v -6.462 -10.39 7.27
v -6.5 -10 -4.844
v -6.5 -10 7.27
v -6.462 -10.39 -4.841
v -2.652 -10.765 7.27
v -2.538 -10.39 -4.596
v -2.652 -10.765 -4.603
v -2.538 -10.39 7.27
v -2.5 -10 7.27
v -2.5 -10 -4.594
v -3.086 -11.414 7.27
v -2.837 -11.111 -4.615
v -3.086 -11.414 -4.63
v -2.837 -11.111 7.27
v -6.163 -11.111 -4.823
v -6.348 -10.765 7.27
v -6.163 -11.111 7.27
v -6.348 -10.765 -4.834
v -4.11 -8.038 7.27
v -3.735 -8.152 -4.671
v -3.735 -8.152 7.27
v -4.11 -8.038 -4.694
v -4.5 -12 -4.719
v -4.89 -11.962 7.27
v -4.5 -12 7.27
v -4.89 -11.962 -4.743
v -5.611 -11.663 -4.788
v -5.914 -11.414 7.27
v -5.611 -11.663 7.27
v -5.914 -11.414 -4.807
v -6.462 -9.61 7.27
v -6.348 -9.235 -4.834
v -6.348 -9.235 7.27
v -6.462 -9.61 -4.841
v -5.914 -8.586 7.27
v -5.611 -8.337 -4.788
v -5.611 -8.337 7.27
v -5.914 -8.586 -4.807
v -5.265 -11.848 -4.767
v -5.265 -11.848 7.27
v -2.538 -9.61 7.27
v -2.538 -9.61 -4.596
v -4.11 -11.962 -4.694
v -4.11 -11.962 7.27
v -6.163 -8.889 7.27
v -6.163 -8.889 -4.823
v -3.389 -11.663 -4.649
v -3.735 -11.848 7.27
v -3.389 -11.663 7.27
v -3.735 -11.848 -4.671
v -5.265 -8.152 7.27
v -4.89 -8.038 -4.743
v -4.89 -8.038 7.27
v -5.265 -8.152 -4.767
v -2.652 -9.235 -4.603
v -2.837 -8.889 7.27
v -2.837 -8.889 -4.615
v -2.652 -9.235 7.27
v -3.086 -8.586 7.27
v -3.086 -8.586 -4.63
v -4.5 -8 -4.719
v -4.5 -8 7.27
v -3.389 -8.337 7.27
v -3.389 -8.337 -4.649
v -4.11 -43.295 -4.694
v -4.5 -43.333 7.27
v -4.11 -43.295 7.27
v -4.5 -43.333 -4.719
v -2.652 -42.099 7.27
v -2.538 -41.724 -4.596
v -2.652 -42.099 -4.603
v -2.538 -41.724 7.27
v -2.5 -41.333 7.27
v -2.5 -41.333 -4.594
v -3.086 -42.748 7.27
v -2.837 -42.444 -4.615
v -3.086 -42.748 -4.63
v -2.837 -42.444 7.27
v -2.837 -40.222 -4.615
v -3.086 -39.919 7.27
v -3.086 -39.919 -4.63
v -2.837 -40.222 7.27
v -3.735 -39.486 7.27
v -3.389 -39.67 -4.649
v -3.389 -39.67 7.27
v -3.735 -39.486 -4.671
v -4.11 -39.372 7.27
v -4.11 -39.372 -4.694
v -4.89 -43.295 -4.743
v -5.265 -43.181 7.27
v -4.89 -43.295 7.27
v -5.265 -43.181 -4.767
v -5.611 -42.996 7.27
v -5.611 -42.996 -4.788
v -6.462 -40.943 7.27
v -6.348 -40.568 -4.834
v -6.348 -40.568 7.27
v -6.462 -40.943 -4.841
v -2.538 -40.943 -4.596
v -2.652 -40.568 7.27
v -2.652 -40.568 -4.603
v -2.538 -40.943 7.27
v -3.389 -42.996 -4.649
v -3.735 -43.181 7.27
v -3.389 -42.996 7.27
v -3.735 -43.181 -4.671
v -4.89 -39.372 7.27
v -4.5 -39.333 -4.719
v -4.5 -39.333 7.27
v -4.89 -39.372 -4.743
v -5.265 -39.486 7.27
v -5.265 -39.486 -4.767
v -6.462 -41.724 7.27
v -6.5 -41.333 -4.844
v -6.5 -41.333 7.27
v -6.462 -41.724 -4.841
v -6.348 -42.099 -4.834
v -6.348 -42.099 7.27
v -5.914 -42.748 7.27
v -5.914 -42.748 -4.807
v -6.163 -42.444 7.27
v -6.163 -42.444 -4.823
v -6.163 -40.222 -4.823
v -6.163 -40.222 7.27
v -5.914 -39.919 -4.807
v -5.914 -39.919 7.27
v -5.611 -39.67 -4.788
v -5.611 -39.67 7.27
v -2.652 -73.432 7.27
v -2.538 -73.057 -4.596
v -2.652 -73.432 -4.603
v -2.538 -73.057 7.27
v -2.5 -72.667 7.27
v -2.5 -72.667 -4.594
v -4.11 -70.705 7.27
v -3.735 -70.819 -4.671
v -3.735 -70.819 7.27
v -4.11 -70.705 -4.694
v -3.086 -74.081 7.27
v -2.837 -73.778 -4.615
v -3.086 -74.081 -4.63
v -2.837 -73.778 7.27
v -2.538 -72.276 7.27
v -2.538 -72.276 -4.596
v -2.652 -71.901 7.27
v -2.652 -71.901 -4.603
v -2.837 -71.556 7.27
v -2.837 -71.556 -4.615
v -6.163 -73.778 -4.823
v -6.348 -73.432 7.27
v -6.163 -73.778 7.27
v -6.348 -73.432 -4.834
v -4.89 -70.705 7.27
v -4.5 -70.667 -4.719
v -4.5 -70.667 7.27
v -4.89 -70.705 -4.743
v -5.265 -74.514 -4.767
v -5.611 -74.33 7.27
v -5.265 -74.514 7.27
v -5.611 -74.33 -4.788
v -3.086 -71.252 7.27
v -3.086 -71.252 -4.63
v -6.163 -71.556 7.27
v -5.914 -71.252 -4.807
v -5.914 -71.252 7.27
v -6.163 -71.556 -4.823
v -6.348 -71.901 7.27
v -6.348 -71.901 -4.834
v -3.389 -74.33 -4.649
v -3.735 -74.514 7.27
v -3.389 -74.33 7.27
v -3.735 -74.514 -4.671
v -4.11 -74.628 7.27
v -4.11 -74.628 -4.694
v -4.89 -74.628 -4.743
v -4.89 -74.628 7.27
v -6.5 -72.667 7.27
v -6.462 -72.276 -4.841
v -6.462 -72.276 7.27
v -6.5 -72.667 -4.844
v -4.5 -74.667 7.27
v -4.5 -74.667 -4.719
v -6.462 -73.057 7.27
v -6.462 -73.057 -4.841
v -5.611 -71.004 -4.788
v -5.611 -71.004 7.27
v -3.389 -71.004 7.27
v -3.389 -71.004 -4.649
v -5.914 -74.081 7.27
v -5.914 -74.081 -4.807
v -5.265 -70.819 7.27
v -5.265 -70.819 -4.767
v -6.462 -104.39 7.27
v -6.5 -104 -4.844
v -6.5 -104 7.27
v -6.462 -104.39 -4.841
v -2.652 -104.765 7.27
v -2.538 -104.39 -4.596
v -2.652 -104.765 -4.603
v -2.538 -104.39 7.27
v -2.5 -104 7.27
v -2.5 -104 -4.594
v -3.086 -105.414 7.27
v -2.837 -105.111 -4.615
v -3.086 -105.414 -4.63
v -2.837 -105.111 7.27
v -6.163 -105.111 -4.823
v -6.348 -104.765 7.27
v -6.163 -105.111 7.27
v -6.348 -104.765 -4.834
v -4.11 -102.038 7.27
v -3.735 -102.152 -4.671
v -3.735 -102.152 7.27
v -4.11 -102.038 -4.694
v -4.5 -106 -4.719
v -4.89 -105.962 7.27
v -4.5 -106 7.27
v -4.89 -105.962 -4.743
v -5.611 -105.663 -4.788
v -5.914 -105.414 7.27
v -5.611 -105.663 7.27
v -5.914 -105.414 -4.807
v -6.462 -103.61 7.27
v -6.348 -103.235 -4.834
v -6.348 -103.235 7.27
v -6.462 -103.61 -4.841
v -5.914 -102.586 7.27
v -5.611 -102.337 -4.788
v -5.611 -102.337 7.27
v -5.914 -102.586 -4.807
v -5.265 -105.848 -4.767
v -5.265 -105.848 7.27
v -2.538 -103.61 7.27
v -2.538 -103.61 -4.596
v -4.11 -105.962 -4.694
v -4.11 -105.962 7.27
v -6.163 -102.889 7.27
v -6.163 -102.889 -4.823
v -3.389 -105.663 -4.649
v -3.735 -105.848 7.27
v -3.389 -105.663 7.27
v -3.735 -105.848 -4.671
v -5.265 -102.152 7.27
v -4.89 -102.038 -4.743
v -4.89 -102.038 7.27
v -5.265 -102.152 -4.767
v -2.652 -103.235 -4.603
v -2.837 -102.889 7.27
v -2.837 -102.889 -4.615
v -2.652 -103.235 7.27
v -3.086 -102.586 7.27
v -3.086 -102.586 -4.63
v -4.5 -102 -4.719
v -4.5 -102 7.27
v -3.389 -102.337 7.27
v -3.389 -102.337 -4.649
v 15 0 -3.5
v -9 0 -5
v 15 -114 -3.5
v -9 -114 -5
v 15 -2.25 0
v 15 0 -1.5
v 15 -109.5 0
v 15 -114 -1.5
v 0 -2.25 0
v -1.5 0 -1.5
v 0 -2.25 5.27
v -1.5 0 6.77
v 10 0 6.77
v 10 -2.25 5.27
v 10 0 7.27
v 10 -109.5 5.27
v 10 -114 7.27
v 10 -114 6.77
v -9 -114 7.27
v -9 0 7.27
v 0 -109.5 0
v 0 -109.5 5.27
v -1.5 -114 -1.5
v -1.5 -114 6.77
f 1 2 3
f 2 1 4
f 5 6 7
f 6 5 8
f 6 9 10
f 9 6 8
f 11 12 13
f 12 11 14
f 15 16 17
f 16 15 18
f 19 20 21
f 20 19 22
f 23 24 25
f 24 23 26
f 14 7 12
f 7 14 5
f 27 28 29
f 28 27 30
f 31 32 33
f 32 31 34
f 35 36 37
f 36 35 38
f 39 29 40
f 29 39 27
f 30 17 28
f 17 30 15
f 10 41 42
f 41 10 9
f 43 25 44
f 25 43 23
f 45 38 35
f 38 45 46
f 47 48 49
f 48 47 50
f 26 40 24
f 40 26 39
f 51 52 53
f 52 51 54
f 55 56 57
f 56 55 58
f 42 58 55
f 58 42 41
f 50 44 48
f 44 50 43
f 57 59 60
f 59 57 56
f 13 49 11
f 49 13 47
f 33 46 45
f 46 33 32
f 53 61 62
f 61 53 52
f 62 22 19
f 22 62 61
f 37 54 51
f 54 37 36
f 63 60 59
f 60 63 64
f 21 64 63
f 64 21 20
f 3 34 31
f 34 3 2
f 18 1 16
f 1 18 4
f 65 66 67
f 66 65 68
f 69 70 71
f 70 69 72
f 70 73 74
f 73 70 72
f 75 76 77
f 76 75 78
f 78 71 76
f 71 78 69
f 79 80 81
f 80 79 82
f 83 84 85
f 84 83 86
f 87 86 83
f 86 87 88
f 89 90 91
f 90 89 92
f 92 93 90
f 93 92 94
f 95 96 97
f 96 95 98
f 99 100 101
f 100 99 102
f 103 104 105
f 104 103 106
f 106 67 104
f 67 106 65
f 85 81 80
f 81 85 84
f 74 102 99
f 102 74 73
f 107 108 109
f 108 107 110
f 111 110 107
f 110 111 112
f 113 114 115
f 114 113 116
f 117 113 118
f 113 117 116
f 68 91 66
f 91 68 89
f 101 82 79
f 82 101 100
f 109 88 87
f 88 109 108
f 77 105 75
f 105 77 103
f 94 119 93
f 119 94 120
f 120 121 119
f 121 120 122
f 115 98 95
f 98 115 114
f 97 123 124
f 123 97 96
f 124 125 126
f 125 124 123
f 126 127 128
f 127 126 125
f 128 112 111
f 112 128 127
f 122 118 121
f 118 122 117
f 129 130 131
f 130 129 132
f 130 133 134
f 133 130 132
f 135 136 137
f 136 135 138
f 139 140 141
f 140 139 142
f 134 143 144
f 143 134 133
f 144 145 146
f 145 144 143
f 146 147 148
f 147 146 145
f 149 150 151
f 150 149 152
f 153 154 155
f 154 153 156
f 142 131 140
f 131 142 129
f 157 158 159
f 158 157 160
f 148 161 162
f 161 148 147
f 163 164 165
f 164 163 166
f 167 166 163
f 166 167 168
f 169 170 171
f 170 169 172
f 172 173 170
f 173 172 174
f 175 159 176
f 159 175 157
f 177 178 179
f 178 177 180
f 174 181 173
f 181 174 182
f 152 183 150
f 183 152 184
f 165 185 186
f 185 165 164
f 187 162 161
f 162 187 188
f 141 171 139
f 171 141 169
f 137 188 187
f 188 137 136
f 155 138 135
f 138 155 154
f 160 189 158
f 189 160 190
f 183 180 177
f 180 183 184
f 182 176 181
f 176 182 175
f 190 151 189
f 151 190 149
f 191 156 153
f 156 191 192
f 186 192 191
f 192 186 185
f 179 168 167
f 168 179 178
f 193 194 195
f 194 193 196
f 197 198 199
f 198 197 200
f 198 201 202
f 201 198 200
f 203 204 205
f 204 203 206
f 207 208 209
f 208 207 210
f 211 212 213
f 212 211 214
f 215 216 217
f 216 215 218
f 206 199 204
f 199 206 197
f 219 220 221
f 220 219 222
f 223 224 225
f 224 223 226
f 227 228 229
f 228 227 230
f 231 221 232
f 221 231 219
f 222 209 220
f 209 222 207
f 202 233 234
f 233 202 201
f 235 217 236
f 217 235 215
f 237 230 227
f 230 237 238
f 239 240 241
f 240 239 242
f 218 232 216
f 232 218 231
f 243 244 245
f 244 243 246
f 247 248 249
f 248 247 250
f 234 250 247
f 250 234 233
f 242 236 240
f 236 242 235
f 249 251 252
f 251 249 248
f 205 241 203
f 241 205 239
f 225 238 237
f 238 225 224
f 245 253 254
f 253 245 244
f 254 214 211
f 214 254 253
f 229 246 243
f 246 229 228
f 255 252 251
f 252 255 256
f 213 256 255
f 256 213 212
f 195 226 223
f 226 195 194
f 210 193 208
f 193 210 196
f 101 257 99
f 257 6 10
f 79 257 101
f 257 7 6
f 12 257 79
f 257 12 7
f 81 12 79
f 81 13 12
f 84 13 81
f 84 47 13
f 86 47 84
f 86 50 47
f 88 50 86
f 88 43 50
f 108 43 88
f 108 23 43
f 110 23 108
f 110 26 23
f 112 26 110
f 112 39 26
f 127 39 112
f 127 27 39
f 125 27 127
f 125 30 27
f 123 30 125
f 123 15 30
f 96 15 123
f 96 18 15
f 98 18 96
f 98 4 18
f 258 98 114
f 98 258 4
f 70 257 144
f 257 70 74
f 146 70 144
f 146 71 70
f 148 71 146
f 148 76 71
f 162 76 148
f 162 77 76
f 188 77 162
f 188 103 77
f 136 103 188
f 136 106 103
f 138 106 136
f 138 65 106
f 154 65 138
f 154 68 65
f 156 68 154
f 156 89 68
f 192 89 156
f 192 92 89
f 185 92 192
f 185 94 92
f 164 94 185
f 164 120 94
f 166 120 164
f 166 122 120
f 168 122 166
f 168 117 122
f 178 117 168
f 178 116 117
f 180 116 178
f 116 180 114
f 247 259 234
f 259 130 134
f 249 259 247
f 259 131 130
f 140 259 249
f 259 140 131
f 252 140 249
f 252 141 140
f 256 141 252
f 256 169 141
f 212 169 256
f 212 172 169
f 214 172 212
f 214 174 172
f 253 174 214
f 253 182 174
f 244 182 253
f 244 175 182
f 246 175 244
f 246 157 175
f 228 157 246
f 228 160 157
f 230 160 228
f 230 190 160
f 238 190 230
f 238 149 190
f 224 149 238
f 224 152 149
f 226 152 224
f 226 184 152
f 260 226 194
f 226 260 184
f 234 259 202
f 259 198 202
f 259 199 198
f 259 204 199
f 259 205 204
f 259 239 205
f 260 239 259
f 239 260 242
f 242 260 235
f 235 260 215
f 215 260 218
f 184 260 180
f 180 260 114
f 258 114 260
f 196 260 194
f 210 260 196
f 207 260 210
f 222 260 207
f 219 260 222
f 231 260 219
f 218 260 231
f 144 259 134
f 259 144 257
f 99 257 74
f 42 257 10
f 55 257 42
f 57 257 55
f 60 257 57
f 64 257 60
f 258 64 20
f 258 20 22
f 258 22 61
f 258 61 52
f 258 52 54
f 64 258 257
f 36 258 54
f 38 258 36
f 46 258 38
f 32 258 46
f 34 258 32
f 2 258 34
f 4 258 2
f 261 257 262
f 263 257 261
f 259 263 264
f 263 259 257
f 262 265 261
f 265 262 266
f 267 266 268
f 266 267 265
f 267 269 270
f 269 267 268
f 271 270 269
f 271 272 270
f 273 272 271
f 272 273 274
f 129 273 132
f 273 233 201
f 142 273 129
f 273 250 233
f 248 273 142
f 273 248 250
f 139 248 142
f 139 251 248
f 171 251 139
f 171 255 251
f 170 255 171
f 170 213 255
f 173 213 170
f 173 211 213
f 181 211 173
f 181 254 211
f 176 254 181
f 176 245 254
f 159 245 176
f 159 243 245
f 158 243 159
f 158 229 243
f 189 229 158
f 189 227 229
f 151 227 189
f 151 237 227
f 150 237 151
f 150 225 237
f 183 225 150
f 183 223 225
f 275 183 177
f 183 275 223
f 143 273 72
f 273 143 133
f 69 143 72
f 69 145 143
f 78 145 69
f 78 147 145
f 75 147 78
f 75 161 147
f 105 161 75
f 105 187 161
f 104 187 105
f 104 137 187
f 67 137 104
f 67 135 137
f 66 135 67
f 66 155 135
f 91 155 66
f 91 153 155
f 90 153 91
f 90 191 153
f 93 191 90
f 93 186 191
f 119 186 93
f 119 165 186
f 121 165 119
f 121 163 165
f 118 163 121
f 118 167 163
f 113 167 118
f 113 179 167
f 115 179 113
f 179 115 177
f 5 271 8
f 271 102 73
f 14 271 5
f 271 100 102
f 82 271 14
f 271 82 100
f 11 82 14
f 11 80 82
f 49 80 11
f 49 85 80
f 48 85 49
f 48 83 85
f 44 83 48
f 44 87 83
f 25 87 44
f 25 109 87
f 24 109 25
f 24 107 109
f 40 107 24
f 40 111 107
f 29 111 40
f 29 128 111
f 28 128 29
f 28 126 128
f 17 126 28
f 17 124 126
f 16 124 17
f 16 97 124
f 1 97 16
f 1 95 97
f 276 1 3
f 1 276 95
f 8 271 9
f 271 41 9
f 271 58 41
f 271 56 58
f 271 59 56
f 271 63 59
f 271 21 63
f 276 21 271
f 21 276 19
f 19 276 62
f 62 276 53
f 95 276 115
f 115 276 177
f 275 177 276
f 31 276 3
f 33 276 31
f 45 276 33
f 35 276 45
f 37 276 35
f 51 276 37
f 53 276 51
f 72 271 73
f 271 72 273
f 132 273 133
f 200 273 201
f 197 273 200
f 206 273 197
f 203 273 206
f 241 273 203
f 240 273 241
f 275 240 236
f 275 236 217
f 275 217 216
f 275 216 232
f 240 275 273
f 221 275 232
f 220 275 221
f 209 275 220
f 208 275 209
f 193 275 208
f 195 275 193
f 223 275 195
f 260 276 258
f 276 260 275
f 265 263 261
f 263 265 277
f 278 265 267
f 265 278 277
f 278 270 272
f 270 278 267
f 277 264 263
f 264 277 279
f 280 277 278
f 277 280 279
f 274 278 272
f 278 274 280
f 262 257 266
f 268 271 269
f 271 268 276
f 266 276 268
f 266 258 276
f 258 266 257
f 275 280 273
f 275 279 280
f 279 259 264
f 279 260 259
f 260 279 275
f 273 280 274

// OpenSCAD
//use <tubemesh.scad>;
// params = [sections,sectionCounts]

// written for tail-recursion
// _subtotals[i] = list[0] + ... + list[i-1]
function _subtotals(list,soFar=[]) =
        len(soFar) >= 1+len(list) ? soFar :
        _subtotals(list,
            let(n1=len(soFar))
            concat(soFar, n1>0 ? soFar[n1-1]+list[n1-1] : 0));

function _flatten(list) = [for (a=list) for(b=a) b];

function _reverseTriangle(t) = [t[2], t[1], t[0]];

// smallest angle in triangle
function _minAngle(p1,p2,p3) =
    let(a = p2-p1,
        b = p3-p1,
        c = p3-p2,
        v1 = a*b,
        v2 = -(c*a))
        v1 == 0 || v2 == 0 ? 0 :
        let( na = norm(a),
             a1 = acos(v1 / (na*norm(b))),
             a2 = acos(v2 / (na*norm(c))) )
        min(a1,a2,180-(a1+a2));

// triangulate square to maximize smallest angle
function _doSquare(points,i11,i21,i22,i12,optimize=true) =
    points[i11]==points[i12] ? [[i11,i21,i22]] :
    points[i21]==points[i22] ? [[i22,i12,i11]] :
    !optimize ? [[i11,i21,i22], [i22,i12,i11]] :
    let (m1 = min(_minAngle(points[i11],points[i21],points[i22]), _minAngle(points[i22],points[i12],points[i11])),
        m2 = min(_minAngle(points[i11],points[i21],points[i12]),
                _minAngle(points[i21],points[i22],points[i12])) )
        m2 <= m1 ? [[i11,i21,i22], [i22,i12,i11]] :
                  [[i11,i21,i12], [i21,i22,i12]];

/*
function _inTriangle(v1,t) = (v1==t[0] || v1==t[1] || v1==t[2]);

function _findTheDistinctVertex(t1,t2) =
    let(in = [for(i=[0:2]) _inTriangle(t1[i],t2)])
    ! in[0] && in[1] && in[2] ? 0 :
    ! in[1] && in[0] && in[2] ? 1 :
    ! in[2] && in[0] && in[1] ? 2 :
    undef;

// make vertex i come first
function _rotateTriangle(t,i) =
    [for (j=[0:2]) t[(j+i)%3]];

function _optimize2Triangles(points,t1,t2) =
    let(i1 = _findTheDistinctVertex(t1,t2))
    i1 == undef ? [t1,t2] :
    let(i2 = _findTheDistinctVertex(t2,t1))
    i2 == undef ? [t1,t2] :
    let(t1 = _rotateTriangle(t1,i1),
        t2 = _rotateTriangle(t2,i2))
    _doSquare(points,t1[1],t2[0],t2[1],t1[0],optimize=true);

// a greedy optimization for a strip of triangles most of which adjoin one another; written for tail-recursion
function _optimizeTriangles(points,triangles,position=0,optimize=true,iterations=4) =
        !optimize || position >= iterations*len(triangles) ? triangles :
            _optimizeTriangles(points,
                let(
                    n = len(triangles),
                    position1=position%n,
                    position2=(position+1)%n,
                    opt=_optimize2Triangles(points,triangles[position1],triangles[position2]))
                    [for (i=[0:len(triangles)-1])
                        i == position1 ? opt[0] :
                        i == position2 ? opt[1] :
                            triangles[i]],
                position=position+1);
*/

function _removeEmptyTriangles(points,triangles) =
    [for(t=triangles)
        if(true || points[t[0]] != points[t[1]] && points[t[1]] != points[t[2]] && points[t[2]] != points[t[0]]) t];

// n1 and n2 should be fairly small, so this doesn't need
// tail-recursion
// this assumes n1<=n2
function _tubeSegmentTriangles(points,index1,n1,index2,n2,i=0,soFar=[],optimize=true)
    = i>=n2 ? _removeEmptyTriangles(points,soFar) :
            let(i21=i,
                i22=(i+1)%n2,
                i11=floor((i21)*n1/n2+0.5)%n1,
                i12=floor((i22)*n1/n2+0.5)%n1,
                add = i11==i12 ? [[index1+i11,index2+i21,index2+i22]] :
                    _doSquare(points,index1+i11,index2+i21,index2+i22,index1+i12,optimize=optimize))
                _tubeSegmentTriangles(points,index1,n1,index2,n2,i=i+1,soFar=concat(soFar,add),optimize=optimize);

function _tubeSegmentFaces(points,index,n1,n2,optimize=true)
    = n1<n2 ? _tubeSegmentTriangles(points,index,n1,index+n1,n2,optimize=optimize) :
        [for (f=_tubeSegmentTriangles(points,index+n1,n2,index,n1,optimize=optimize)) _reverseTriangle(f)];

function _tubeMiddleFaces(points,counts,subtotals,optimize=true) = [ for (i=[1:len(counts)-1])
           for (face=_tubeSegmentFaces(points,subtotals[i-1],counts[i-1],counts[i],optimize=optimize)) face ];

function _endCaps(counts,subtotals,startCap=true,endCap=true) =
    let( n = len(counts),
         cap1 = counts[0]<=2 || !startCap ? undef : [for(i=[0:counts[0]-1]) i],
         cap2 = counts[n-1]<=2 || !endCap ? undef : [for(i=[counts[n-1]-1:-1:0]) subtotals[n-1]+i] )
       [for (c=[cap1,cap2]) if (c!=undef) c];

function _tubeFaces(sections,startCap=true,endCap=true,optimize=true) =
                let(
        counts = [for (s=sections) len(s)],
        points = _flatten(sections),
        subtotals = _subtotals(counts))
            concat(_tubeMiddleFaces(points,counts,subtotals,optimize=optimize),_endCaps(counts,subtotals,startCap=true,endCap=true));

function _removeDuplicates1(points,soFar=[[],[]]) =
        len(soFar[0]) >= len(points) ? soFar :
            _removeDuplicates1(points,
               let(
                mapSoFar=soFar[0],
                pointsSoFar=soFar[1],
                j=len(mapSoFar),
                k=search([points[j]], pointsSoFar)[0])
                k == []? [concat(mapSoFar,[len(pointsSoFar)]),
                            concat(pointsSoFar,[points[j]])] :
                           [concat(mapSoFar,[k]),pointsSoFar]);

function _removeDuplicates(points, faces) =
    let(fix=_removeDuplicates1(points),
        map=fix[0],
        newPoints=fix[1],
        newFaces=[for(f=faces) [for(v=f) map[v]]])
            [newPoints, newFaces];

function pointsAndFaces(sections,startCap=true,endCap=true,optimize=true) =
        let(
            points0=_flatten(sections),
            faces0=_tubeFaces(sections,startCap=startCap,endCap=endCap,optimize=optimize))
        _removeDuplicates(points0,faces0);

function sectionZ(section,z) = [for(xy=section) [xy[0],xy[1],z]];

function shiftSection(section,delta) = [for(p=section) [for(i=[0:len(delta)-1]) (p[i]==undef?0:p[i])+delta[i]]];

module tubeMesh(sections,startCap=true,endCap=true,optimize=true) {
    pAndF = pointsAndFaces(sections,startCap=startCap,endCap=endCap,optimize=optimize);
    polyhedron(points=pAndF[0],faces=pAndF[1]);
}

// increase number of points from len(section) to n
function _interpolateSection(section,n) =
        let(m=len(section))
        n == m ? section :
        n < m ? undef :
            [for(i=[0:m-1])
                let(cur=floor(i*n/m),
                    k=floor((i+1)*n/m)-cur,
                    i2=(i+1)%m)
                    for(j=[0:k-1])
                        let(t=j/k)
                            section[i]*(1-t)+section[i2]*t];

function arcPoints(r=10,d=undef,start=0,end=180,z=undef) =
            let(r=d==undef?r:d/2,
                n=getPointsAround(abs(end-start)))
                    r*[for(i=[0:n])
                        let(angle=start+i*(end-start)/n) [cos(angle),sin(angle)]];

function ngonPoints(n=4,r=10,d=undef,rotate=0,z=undef) =
            let(r=d==undef?r:d/2)
            z==undef ?
            r*[for(i=[0:n-1]) let(angle=i*360/n+rotate) [cos(angle),sin(angle)]] :
            [for(i=[0:n-1]) let(angle=i*360/n+rotate) [r*cos(angle),r*sin(angle),z]];

function starPoints(n=10,r1=5,r2=10,rotate=0,z=undef) =
          z==undef ?
            [for(i=[0:2*n-1]) let(angle=i*180/n+rotate) (i%2?r1:r2) * [cos(angle),sin(angle)]] :
            [for(i=[0:2*n-1]) let(angle=i*180/n+rotate, r=i%2?r1:r2) [r*cos(angle),r*sin(angle),z]];

function roundedSquarePoints(size=[10,10],radius=2,z=undef) =
    let(n=$fn?$fn:32,
        x=len(size)>=2 ? size[0] : size,
        y=len(size)>=2 ? size[1] : size,
        centers=[[x-radius,y-radius],[radius,y-radius],[radius,radius],[x-radius,radius]],
        section=[for(i=[0:n-1])
            let(center=centers[floor(i*4/n)],
                angle=360*i/n)
            center+radius*[cos(angle),sin(angle)]])
        z==undef ? section : sectionZ(section,z);

function getPointsAround(radius, angle=360) =
    max(3, $fn ? ceil($fn*angle/360) :
        max(floor(0.5+angle/$fa), floor(0.5+2*radius*PI*angle/360/$fs)));

// warning: no guarantee of perfect convexity
module mySphere(r=10,d=undef) {
    GA = 2.39996322972865332 * 180 / PI;
    radius = d==undef ? r : d/2;
    pointsAround = getPointsAround(radius);
    numSlices0 = (pointsAround + pointsAround % 2)/2;
    numSlices = numSlices0 + (numSlices0%2);
    sections = radius*[for(i=[0:numSlices])
                    i == 0 ? [[0,0,-1]] :
                    i == numSlices ? [[0,0,1]] :
                    let(
                        lat = (i-numSlices/2)/(numSlices/2)*90,
                        z1 = sin(lat),
                        r1 = cos(lat),
                        count = max(3,floor(0.5 + pointsAround * abs(r1))))
                        ngonPoints(count,r=r1,z=z1)];
    data = pointsAndFaces(sections,optimize=false);
    polyhedron(points=data[0], faces=data[1]);
}

module morphExtrude(section1,section2,height=undef,twist=0,numSlices=10,startCap=true,endCap=true,optimize=false) {
    n = max(len(section1),len(section2));

    section1interp = _interpolateSection(section1,n);
    section2interp = _interpolateSection(section2,n);
    sections = height == undef ?
                      [for(i=[0:numSlices])
                        let(t=i/numSlices)
                        (1-t)*section1interp+t*section2interp] :
                      [for(i=[0:numSlices])
                        let(t=i/numSlices,
                            theta = t*twist,
                            section=(1-t)*section1interp+t*section2interp)
                        [for(p=section) [p[0]*cos(theta)-p[1]*sin(theta),p[0]*sin(theta)+p[1]*cos(theta),height*t]]];

    tubeMesh(sections,startCap=startCap,endCap=endCap,optimize=false);
}

module cone(r=10,d=undef,height=10) {
    radius = d==undef ? r : d/2;
    pointsAround =
        $fn ? $fn :
        max(3, floor(0.5+360/$fa), floor(0.5+2*radius*PI/$fs));
    morphExtrude(ngonPoints(n=pointsAround,r=radius), [[0,0]], height=height,optimize=false);
}

module prism(base=[[0,0,0],[1,0,0],[0,1,0]], vertical=[0,0,1]) {
    morphExtrude(base,[for(v=base) v+vertical],numSlices=1);
}


boardThickness = 5.27;
length = 114;
inset1 = 1.5;
inset2 = 1.5;
insetRatio = 1.5;
bottomSlideWidth = 15;
topSlideWidth = 10;
holderWidth = 9;
tolerance = 0;
bottomMinimumThickness = 3.5;
bottomMaximumThickness = 5;
topThickness = 2;
holeDiameter = 4;
hole1Offset = 10;
numHoles = 4;

function crossSection(inset=0) =
        [[-holderWidth,-bottomMaximumThickness],
        [bottomSlideWidth,-bottomMinimumThickness],
        [bottomSlideWidth,-inset],
        [-inset,-inset],
        [-inset,boardThickness+tolerance+inset],
        [topSlideWidth,boardThickness+tolerance+inset],
        [topSlideWidth,boardThickness+tolerance+topThickness],
        [-holderWidth,boardThickness+tolerance+topThickness]];

module slide() {
    s0 = crossSection(inset=inset1);
    s1 = crossSection();
    s2 = crossSection(inset=inset2);
    tubeMesh([sectionZ(s0,0), sectionZ(s1,inset1*insetRatio), sectionZ(s1,length-(inset1+inset2)*insetRatio), sectionZ(s2,length)]);
}

rotate([90,0,0])
render(convexity=2)
difference() {
    slide();
    for (i=[0:numHoles-1]) {
        z = (length-(hole1Offset*2))/(numHoles-1)*i+hole1Offset;
        translate([-holderWidth/2,0,z])
        rotate([90,0,0])
        cylinder(h=100,d=holeDiameter,center=true,$fn=32);
    }
}
